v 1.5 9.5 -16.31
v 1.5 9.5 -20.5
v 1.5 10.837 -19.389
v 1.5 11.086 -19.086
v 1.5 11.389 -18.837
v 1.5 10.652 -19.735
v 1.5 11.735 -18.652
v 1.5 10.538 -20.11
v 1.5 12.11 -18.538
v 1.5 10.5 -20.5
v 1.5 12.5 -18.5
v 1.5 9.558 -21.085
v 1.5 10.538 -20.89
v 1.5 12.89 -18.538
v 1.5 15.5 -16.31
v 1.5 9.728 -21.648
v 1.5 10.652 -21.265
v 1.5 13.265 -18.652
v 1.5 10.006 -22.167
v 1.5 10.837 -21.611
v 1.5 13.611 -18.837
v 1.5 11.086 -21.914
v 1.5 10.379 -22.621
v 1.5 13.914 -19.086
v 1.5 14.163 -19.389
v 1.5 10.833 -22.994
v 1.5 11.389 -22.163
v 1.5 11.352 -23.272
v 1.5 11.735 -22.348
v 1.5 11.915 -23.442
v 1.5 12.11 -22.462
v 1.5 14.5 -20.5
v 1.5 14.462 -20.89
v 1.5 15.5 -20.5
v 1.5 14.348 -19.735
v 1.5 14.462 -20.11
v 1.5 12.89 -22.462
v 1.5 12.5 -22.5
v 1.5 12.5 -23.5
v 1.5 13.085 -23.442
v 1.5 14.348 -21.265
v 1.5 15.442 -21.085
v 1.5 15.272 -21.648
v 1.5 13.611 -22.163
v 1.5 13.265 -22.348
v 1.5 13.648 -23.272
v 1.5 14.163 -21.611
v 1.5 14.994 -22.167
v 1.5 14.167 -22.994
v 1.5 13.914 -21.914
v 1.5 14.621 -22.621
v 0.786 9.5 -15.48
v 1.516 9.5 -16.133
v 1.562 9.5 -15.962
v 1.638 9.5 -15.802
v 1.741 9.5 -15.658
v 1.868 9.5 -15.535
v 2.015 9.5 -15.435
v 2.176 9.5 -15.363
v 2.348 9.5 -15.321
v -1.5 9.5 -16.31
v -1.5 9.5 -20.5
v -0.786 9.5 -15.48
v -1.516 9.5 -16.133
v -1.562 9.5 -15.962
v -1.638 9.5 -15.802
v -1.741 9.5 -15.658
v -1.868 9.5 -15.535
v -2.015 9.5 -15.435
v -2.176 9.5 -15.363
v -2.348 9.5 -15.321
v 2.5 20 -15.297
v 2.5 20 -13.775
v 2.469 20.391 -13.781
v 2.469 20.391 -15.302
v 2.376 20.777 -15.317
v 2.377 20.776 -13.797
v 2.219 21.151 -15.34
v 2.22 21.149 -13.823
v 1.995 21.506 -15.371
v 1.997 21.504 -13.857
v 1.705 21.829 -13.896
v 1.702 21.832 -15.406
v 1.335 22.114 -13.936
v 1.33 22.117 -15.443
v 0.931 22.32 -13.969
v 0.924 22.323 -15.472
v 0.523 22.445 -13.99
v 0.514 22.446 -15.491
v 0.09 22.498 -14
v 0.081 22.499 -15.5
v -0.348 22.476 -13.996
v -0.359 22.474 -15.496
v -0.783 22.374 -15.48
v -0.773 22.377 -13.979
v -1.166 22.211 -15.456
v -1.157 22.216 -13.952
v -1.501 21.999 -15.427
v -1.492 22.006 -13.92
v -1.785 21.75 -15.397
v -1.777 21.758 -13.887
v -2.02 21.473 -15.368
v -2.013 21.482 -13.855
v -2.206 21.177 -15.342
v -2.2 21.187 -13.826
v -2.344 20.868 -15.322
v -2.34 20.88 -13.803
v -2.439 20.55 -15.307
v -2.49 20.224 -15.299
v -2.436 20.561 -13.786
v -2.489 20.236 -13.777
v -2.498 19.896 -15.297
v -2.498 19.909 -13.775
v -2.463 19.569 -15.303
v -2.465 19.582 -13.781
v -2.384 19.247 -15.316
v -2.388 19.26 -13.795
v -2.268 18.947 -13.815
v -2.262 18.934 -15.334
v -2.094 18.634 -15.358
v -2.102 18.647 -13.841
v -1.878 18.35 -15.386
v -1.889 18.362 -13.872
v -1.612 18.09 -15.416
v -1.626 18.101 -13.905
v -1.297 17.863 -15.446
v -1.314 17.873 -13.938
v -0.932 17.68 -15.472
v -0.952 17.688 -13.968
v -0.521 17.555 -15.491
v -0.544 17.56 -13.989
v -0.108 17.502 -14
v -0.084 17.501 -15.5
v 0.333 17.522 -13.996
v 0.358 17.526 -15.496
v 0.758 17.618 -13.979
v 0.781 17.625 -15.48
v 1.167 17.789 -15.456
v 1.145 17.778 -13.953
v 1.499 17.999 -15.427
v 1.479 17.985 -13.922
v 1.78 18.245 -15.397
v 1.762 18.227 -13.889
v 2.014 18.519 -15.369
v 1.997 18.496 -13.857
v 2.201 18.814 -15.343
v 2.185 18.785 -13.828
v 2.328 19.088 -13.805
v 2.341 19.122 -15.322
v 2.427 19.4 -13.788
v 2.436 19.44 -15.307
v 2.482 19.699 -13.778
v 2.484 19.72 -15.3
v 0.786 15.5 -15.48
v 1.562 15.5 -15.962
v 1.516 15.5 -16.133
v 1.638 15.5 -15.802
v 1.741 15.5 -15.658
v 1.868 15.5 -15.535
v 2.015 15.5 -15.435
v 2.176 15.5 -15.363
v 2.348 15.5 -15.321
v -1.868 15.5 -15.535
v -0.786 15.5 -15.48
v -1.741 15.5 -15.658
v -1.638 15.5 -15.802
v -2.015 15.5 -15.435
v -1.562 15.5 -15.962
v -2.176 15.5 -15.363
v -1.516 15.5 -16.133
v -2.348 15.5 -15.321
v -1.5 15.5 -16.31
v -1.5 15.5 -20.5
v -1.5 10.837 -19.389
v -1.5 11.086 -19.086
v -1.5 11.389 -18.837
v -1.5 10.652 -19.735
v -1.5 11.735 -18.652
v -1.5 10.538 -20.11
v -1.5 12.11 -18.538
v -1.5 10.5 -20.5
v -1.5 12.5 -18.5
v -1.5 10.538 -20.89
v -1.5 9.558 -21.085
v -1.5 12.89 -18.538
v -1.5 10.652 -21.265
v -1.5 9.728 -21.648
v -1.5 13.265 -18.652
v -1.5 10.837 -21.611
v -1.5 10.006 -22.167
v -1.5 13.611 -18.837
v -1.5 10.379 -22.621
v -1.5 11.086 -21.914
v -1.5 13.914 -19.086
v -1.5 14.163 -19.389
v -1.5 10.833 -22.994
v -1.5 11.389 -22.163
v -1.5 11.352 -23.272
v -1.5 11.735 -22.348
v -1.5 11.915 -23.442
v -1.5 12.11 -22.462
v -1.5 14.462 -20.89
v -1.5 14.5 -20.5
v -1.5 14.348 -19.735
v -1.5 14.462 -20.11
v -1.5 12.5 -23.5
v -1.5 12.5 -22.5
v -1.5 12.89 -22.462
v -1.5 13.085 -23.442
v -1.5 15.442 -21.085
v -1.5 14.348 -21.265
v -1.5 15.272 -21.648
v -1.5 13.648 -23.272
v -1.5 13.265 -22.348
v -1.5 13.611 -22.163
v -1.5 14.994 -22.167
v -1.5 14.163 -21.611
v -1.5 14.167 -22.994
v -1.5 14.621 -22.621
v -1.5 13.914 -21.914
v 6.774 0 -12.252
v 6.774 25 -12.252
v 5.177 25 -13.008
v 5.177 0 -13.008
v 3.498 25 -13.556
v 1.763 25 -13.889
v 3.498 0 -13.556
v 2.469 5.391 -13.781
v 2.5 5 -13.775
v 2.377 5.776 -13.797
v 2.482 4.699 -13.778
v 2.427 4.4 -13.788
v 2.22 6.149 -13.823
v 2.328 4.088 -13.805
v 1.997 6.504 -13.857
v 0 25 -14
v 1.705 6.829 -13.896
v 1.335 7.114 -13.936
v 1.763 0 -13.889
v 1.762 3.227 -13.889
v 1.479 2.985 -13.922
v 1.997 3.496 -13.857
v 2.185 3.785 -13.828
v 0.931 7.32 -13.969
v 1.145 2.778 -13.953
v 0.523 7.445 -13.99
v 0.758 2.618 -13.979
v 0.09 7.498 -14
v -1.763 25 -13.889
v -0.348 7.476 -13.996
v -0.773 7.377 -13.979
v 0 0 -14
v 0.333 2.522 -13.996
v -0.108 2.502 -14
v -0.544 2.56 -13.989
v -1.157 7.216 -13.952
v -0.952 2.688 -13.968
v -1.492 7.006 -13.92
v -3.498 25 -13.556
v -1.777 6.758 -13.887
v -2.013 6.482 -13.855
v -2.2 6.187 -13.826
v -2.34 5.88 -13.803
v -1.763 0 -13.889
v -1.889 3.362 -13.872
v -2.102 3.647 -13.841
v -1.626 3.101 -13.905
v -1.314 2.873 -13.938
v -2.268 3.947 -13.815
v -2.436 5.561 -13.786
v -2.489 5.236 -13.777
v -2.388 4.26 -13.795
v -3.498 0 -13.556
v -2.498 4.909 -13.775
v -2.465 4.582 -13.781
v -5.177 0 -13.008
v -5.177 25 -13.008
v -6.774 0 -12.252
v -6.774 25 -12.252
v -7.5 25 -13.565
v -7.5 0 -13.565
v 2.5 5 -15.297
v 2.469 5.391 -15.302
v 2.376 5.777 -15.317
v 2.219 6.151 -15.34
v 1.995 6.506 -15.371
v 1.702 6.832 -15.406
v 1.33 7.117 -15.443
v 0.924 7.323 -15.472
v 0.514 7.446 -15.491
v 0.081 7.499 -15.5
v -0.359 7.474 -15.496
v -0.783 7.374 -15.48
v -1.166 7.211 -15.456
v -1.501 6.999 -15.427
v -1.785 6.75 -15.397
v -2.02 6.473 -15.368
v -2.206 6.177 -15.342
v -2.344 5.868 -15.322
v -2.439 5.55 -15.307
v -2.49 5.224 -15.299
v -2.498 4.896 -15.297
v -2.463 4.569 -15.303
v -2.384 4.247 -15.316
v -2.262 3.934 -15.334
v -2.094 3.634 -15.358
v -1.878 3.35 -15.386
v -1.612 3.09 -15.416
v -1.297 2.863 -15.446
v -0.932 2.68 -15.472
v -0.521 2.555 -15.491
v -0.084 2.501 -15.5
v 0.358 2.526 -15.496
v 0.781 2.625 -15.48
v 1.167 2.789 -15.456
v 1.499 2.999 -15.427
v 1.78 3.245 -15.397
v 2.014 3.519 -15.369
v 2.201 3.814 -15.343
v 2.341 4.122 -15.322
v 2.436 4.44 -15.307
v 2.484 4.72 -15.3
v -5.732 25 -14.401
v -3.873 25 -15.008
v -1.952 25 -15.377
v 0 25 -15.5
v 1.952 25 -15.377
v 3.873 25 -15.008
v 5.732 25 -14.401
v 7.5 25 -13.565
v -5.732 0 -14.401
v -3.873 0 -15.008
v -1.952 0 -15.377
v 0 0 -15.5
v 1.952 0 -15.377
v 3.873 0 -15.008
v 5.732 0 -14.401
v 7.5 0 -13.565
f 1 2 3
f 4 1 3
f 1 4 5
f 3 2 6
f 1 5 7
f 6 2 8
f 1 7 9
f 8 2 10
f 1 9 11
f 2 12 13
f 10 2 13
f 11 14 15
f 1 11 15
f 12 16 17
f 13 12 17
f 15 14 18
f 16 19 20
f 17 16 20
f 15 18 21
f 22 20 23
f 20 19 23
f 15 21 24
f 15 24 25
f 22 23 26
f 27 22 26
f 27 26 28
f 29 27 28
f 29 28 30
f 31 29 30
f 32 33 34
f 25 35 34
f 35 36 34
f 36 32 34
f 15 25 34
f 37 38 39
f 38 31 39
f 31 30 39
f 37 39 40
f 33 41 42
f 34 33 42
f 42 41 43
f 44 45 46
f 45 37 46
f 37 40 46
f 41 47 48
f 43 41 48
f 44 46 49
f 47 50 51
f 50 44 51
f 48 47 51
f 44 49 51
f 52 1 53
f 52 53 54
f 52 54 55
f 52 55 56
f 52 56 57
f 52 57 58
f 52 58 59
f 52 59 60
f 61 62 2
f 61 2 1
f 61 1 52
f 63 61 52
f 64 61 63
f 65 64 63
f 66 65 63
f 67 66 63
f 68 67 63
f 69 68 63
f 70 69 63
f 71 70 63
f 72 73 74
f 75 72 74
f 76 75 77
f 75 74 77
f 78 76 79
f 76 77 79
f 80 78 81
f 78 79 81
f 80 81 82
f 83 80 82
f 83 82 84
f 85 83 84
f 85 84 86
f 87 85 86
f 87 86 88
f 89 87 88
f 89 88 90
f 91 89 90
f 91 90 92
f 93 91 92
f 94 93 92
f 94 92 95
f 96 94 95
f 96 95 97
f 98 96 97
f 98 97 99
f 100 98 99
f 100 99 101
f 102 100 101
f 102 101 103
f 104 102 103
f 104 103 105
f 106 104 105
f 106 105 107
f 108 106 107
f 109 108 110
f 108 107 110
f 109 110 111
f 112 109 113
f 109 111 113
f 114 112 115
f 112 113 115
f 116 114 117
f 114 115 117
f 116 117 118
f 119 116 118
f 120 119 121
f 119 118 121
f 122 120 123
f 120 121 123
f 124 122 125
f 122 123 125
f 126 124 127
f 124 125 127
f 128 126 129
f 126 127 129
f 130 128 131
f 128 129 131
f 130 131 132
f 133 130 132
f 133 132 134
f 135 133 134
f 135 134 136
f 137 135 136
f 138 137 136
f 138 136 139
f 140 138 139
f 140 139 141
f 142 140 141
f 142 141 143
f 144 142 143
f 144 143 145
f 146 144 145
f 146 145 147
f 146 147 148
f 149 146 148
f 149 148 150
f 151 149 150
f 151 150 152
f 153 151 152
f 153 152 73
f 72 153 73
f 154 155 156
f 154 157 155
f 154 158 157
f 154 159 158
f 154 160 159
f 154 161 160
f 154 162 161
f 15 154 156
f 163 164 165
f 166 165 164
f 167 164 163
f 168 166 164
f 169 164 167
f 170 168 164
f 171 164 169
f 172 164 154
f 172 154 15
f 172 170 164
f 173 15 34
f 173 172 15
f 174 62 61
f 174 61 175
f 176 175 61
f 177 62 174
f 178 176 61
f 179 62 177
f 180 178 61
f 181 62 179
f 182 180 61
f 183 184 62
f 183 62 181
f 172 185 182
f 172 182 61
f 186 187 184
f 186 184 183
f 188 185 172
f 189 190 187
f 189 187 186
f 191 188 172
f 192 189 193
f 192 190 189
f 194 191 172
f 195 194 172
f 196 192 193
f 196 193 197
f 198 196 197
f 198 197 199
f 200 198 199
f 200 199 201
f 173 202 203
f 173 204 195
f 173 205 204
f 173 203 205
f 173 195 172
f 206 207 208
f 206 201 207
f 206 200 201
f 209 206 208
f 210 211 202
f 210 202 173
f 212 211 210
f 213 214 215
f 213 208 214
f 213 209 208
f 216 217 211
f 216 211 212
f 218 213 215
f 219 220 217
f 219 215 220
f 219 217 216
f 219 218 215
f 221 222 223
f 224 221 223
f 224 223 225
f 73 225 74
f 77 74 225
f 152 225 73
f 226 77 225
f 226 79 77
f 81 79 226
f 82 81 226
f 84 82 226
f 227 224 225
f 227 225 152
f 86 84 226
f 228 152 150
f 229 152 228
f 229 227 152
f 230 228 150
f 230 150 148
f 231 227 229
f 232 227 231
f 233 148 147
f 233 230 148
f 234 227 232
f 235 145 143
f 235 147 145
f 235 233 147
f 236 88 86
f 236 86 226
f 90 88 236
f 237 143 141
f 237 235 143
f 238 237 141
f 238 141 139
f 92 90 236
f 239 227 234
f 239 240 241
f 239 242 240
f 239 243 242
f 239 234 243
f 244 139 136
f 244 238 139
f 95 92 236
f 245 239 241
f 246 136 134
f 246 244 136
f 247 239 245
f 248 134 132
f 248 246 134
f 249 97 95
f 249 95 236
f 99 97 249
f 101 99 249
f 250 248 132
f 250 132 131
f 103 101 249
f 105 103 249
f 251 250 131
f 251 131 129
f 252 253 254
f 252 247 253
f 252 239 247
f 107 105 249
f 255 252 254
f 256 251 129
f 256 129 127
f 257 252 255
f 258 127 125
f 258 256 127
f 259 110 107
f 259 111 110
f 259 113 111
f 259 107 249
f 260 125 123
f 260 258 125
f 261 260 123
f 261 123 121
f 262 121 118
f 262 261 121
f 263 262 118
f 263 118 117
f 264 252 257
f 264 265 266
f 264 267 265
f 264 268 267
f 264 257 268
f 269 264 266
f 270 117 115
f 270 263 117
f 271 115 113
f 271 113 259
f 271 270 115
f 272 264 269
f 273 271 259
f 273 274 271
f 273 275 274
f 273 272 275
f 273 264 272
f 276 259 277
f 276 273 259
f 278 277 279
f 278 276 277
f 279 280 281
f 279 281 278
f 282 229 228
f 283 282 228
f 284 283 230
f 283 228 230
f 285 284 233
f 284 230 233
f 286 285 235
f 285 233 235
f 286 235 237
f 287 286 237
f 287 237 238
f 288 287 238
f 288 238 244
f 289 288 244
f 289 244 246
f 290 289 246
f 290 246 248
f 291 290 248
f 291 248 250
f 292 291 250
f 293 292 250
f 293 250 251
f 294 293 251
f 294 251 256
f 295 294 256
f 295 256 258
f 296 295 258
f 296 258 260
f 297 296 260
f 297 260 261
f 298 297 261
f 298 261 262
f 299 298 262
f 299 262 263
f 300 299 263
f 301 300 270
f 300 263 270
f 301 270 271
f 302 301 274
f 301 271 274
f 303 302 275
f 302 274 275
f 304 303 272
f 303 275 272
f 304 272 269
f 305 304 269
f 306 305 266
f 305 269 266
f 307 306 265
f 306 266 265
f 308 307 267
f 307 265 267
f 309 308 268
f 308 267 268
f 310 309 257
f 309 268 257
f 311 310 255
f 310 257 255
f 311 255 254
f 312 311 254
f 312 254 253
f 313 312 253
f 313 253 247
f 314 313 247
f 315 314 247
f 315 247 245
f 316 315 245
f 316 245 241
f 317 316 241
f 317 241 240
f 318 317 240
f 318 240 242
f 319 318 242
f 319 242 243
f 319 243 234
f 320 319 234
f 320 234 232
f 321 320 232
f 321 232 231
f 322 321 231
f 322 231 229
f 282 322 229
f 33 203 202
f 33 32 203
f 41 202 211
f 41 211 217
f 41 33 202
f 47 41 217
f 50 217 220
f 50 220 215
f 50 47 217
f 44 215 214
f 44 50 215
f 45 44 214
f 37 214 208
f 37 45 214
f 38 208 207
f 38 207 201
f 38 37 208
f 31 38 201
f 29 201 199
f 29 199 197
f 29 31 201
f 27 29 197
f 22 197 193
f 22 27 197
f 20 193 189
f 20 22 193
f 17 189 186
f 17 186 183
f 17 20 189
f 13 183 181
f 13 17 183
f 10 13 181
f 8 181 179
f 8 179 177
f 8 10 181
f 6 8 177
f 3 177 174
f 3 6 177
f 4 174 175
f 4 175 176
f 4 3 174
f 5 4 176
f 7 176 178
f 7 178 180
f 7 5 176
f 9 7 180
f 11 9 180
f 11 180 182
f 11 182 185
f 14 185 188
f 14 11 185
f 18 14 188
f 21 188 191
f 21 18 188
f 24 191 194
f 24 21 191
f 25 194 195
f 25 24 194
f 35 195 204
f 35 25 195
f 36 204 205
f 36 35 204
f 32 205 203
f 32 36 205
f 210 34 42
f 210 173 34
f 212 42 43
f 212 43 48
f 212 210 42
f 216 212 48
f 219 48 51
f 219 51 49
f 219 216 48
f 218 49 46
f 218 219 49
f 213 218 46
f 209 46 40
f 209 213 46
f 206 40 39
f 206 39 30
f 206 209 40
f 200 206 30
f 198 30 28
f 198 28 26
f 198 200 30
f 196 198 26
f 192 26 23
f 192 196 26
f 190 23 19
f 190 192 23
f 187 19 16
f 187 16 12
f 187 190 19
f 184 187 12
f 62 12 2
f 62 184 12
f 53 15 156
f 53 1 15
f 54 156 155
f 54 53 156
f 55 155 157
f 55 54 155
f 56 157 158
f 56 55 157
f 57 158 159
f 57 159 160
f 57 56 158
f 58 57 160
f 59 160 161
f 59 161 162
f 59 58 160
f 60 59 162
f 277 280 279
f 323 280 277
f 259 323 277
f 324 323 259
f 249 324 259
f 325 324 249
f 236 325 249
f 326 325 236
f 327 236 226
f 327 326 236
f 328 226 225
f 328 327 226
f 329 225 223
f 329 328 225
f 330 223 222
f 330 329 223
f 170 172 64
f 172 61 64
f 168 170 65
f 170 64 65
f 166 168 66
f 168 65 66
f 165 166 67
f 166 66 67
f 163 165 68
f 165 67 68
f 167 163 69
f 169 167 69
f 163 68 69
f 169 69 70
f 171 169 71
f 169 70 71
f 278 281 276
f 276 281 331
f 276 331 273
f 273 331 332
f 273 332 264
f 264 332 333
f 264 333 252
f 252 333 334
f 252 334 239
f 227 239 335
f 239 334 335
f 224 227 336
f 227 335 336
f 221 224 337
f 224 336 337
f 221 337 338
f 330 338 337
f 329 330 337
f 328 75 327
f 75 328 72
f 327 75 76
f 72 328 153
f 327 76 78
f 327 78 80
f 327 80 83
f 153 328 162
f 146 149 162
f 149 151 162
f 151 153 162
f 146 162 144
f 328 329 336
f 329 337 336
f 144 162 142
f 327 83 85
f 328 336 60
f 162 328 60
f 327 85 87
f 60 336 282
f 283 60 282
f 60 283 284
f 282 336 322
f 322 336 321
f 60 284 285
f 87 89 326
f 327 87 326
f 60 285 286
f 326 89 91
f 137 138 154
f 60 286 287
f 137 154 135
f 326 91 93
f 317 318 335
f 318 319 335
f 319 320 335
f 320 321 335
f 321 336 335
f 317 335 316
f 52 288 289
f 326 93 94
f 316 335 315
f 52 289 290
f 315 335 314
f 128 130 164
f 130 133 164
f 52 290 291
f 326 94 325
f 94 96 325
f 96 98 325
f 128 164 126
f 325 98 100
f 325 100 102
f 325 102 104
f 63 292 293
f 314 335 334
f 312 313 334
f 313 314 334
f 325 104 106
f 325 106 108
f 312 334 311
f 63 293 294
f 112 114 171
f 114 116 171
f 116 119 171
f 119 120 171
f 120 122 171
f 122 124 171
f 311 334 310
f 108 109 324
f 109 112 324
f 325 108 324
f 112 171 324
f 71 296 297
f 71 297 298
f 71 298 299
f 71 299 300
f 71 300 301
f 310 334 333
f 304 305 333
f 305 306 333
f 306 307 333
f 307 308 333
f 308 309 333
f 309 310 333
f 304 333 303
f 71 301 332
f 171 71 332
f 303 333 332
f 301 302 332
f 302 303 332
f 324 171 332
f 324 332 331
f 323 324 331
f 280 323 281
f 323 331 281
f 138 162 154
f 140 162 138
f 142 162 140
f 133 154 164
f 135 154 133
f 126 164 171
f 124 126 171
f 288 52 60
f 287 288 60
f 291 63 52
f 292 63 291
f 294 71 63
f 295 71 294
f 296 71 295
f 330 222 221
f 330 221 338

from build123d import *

# Parameters (mm, degrees)
SKETCH2_R                = 15.5
SKETCH2_R_2              = 14
BOSS_EXTRUDE1_DEPTH      = 25
SKETCH3_OUTSIDE_W        = 43.094
SKETCH3_OUTSIDE_H        = 43.094
CUT_EXTRUDE1_DEPTH       = 34.249060137
SKETCH5_R                = 2.5
CUT_EXTRUDE2_DEPTH       = 31.356218473
BOSS_EXTRUDE2_DEPTH      = 1.5
BOSS_EXTRUDE2_DEPTH_BACK = 1.5
SKETCH6_R                = 2
FILLET1_R                = 1


with BuildPart() as part:
    # Sketch2 → Boss-Extrude1 (new body)
    with BuildSketch(Plane(origin=(0, 0, 0), x_dir=(1, 0, 0), z_dir=(0, 1, 0))):
        Circle(SKETCH2_R)
        Circle(SKETCH2_R_2, mode=Mode.SUBTRACT)
    extrude(amount=BOSS_EXTRUDE1_DEPTH)

    # Sketch3 outside → Cut-Extrude1 (cut, through all)
    with BuildSketch(Plane(origin=(0, 25, 0), x_dir=(1, 0, 0), z_dir=(0, 1, 0))):
        Rectangle(SKETCH3_OUTSIDE_W, SKETCH3_OUTSIDE_H)
        with BuildLine():
            Line((0, 0), (7.5, 13.564659966))
            ThreePointArc((7.5, 13.564659966), (0, 15.5), (-7.5, 13.564659966))
            Line((-7.5, 13.564659966), (0, 0))
        make_face(mode=Mode.SUBTRACT)
    extrude(amount=-CUT_EXTRUDE1_DEPTH, mode=Mode.SUBTRACT)

    # Sketch5 → Cut-Extrude2 (cut, through all)
    with BuildSketch(Plane.XY):
        with Locations((0, 20)):
            Circle(SKETCH5_R)
        with Locations((0, 5)):
            Circle(SKETCH5_R)
    extrude(amount=-CUT_EXTRUDE2_DEPTH, mode=Mode.SUBTRACT)

    # Sketch6 → Boss-Extrude2 (add, two sides: drawn at the far end of the back side and taken through both)
    with BuildSketch(Plane(origin=(0, 7.5, 0), x_dir=(0, 1, 0), z_dir=(-1, 0, 0)).offset(-BOSS_EXTRUDE2_DEPTH_BACK)):
        with BuildLine():
            Line((2, 20.5), (2, 15.25))
            Line((2, 15.25), (8, 15.25))
            Line((8, 15.25), (8, 20.5))
            ThreePointArc((8, 20.5), (5, 23.5), (2, 20.5))
        make_face()
        with Locations((5, 20.5)):
            Circle(SKETCH6_R, mode=Mode.SUBTRACT)
    extrude(amount=BOSS_EXTRUDE2_DEPTH + BOSS_EXTRUDE2_DEPTH_BACK)

    # Fillet1
    fillet1_edges = [part.edges().sort_by_distance(p)[0] for p in [
        (1.5, 12.5, -15.427248621),
        (-1.5, 12.5, -15.427248621),
    ]]
    fillet(fillet1_edges, radius=FILLET1_R)


solid = part.part
